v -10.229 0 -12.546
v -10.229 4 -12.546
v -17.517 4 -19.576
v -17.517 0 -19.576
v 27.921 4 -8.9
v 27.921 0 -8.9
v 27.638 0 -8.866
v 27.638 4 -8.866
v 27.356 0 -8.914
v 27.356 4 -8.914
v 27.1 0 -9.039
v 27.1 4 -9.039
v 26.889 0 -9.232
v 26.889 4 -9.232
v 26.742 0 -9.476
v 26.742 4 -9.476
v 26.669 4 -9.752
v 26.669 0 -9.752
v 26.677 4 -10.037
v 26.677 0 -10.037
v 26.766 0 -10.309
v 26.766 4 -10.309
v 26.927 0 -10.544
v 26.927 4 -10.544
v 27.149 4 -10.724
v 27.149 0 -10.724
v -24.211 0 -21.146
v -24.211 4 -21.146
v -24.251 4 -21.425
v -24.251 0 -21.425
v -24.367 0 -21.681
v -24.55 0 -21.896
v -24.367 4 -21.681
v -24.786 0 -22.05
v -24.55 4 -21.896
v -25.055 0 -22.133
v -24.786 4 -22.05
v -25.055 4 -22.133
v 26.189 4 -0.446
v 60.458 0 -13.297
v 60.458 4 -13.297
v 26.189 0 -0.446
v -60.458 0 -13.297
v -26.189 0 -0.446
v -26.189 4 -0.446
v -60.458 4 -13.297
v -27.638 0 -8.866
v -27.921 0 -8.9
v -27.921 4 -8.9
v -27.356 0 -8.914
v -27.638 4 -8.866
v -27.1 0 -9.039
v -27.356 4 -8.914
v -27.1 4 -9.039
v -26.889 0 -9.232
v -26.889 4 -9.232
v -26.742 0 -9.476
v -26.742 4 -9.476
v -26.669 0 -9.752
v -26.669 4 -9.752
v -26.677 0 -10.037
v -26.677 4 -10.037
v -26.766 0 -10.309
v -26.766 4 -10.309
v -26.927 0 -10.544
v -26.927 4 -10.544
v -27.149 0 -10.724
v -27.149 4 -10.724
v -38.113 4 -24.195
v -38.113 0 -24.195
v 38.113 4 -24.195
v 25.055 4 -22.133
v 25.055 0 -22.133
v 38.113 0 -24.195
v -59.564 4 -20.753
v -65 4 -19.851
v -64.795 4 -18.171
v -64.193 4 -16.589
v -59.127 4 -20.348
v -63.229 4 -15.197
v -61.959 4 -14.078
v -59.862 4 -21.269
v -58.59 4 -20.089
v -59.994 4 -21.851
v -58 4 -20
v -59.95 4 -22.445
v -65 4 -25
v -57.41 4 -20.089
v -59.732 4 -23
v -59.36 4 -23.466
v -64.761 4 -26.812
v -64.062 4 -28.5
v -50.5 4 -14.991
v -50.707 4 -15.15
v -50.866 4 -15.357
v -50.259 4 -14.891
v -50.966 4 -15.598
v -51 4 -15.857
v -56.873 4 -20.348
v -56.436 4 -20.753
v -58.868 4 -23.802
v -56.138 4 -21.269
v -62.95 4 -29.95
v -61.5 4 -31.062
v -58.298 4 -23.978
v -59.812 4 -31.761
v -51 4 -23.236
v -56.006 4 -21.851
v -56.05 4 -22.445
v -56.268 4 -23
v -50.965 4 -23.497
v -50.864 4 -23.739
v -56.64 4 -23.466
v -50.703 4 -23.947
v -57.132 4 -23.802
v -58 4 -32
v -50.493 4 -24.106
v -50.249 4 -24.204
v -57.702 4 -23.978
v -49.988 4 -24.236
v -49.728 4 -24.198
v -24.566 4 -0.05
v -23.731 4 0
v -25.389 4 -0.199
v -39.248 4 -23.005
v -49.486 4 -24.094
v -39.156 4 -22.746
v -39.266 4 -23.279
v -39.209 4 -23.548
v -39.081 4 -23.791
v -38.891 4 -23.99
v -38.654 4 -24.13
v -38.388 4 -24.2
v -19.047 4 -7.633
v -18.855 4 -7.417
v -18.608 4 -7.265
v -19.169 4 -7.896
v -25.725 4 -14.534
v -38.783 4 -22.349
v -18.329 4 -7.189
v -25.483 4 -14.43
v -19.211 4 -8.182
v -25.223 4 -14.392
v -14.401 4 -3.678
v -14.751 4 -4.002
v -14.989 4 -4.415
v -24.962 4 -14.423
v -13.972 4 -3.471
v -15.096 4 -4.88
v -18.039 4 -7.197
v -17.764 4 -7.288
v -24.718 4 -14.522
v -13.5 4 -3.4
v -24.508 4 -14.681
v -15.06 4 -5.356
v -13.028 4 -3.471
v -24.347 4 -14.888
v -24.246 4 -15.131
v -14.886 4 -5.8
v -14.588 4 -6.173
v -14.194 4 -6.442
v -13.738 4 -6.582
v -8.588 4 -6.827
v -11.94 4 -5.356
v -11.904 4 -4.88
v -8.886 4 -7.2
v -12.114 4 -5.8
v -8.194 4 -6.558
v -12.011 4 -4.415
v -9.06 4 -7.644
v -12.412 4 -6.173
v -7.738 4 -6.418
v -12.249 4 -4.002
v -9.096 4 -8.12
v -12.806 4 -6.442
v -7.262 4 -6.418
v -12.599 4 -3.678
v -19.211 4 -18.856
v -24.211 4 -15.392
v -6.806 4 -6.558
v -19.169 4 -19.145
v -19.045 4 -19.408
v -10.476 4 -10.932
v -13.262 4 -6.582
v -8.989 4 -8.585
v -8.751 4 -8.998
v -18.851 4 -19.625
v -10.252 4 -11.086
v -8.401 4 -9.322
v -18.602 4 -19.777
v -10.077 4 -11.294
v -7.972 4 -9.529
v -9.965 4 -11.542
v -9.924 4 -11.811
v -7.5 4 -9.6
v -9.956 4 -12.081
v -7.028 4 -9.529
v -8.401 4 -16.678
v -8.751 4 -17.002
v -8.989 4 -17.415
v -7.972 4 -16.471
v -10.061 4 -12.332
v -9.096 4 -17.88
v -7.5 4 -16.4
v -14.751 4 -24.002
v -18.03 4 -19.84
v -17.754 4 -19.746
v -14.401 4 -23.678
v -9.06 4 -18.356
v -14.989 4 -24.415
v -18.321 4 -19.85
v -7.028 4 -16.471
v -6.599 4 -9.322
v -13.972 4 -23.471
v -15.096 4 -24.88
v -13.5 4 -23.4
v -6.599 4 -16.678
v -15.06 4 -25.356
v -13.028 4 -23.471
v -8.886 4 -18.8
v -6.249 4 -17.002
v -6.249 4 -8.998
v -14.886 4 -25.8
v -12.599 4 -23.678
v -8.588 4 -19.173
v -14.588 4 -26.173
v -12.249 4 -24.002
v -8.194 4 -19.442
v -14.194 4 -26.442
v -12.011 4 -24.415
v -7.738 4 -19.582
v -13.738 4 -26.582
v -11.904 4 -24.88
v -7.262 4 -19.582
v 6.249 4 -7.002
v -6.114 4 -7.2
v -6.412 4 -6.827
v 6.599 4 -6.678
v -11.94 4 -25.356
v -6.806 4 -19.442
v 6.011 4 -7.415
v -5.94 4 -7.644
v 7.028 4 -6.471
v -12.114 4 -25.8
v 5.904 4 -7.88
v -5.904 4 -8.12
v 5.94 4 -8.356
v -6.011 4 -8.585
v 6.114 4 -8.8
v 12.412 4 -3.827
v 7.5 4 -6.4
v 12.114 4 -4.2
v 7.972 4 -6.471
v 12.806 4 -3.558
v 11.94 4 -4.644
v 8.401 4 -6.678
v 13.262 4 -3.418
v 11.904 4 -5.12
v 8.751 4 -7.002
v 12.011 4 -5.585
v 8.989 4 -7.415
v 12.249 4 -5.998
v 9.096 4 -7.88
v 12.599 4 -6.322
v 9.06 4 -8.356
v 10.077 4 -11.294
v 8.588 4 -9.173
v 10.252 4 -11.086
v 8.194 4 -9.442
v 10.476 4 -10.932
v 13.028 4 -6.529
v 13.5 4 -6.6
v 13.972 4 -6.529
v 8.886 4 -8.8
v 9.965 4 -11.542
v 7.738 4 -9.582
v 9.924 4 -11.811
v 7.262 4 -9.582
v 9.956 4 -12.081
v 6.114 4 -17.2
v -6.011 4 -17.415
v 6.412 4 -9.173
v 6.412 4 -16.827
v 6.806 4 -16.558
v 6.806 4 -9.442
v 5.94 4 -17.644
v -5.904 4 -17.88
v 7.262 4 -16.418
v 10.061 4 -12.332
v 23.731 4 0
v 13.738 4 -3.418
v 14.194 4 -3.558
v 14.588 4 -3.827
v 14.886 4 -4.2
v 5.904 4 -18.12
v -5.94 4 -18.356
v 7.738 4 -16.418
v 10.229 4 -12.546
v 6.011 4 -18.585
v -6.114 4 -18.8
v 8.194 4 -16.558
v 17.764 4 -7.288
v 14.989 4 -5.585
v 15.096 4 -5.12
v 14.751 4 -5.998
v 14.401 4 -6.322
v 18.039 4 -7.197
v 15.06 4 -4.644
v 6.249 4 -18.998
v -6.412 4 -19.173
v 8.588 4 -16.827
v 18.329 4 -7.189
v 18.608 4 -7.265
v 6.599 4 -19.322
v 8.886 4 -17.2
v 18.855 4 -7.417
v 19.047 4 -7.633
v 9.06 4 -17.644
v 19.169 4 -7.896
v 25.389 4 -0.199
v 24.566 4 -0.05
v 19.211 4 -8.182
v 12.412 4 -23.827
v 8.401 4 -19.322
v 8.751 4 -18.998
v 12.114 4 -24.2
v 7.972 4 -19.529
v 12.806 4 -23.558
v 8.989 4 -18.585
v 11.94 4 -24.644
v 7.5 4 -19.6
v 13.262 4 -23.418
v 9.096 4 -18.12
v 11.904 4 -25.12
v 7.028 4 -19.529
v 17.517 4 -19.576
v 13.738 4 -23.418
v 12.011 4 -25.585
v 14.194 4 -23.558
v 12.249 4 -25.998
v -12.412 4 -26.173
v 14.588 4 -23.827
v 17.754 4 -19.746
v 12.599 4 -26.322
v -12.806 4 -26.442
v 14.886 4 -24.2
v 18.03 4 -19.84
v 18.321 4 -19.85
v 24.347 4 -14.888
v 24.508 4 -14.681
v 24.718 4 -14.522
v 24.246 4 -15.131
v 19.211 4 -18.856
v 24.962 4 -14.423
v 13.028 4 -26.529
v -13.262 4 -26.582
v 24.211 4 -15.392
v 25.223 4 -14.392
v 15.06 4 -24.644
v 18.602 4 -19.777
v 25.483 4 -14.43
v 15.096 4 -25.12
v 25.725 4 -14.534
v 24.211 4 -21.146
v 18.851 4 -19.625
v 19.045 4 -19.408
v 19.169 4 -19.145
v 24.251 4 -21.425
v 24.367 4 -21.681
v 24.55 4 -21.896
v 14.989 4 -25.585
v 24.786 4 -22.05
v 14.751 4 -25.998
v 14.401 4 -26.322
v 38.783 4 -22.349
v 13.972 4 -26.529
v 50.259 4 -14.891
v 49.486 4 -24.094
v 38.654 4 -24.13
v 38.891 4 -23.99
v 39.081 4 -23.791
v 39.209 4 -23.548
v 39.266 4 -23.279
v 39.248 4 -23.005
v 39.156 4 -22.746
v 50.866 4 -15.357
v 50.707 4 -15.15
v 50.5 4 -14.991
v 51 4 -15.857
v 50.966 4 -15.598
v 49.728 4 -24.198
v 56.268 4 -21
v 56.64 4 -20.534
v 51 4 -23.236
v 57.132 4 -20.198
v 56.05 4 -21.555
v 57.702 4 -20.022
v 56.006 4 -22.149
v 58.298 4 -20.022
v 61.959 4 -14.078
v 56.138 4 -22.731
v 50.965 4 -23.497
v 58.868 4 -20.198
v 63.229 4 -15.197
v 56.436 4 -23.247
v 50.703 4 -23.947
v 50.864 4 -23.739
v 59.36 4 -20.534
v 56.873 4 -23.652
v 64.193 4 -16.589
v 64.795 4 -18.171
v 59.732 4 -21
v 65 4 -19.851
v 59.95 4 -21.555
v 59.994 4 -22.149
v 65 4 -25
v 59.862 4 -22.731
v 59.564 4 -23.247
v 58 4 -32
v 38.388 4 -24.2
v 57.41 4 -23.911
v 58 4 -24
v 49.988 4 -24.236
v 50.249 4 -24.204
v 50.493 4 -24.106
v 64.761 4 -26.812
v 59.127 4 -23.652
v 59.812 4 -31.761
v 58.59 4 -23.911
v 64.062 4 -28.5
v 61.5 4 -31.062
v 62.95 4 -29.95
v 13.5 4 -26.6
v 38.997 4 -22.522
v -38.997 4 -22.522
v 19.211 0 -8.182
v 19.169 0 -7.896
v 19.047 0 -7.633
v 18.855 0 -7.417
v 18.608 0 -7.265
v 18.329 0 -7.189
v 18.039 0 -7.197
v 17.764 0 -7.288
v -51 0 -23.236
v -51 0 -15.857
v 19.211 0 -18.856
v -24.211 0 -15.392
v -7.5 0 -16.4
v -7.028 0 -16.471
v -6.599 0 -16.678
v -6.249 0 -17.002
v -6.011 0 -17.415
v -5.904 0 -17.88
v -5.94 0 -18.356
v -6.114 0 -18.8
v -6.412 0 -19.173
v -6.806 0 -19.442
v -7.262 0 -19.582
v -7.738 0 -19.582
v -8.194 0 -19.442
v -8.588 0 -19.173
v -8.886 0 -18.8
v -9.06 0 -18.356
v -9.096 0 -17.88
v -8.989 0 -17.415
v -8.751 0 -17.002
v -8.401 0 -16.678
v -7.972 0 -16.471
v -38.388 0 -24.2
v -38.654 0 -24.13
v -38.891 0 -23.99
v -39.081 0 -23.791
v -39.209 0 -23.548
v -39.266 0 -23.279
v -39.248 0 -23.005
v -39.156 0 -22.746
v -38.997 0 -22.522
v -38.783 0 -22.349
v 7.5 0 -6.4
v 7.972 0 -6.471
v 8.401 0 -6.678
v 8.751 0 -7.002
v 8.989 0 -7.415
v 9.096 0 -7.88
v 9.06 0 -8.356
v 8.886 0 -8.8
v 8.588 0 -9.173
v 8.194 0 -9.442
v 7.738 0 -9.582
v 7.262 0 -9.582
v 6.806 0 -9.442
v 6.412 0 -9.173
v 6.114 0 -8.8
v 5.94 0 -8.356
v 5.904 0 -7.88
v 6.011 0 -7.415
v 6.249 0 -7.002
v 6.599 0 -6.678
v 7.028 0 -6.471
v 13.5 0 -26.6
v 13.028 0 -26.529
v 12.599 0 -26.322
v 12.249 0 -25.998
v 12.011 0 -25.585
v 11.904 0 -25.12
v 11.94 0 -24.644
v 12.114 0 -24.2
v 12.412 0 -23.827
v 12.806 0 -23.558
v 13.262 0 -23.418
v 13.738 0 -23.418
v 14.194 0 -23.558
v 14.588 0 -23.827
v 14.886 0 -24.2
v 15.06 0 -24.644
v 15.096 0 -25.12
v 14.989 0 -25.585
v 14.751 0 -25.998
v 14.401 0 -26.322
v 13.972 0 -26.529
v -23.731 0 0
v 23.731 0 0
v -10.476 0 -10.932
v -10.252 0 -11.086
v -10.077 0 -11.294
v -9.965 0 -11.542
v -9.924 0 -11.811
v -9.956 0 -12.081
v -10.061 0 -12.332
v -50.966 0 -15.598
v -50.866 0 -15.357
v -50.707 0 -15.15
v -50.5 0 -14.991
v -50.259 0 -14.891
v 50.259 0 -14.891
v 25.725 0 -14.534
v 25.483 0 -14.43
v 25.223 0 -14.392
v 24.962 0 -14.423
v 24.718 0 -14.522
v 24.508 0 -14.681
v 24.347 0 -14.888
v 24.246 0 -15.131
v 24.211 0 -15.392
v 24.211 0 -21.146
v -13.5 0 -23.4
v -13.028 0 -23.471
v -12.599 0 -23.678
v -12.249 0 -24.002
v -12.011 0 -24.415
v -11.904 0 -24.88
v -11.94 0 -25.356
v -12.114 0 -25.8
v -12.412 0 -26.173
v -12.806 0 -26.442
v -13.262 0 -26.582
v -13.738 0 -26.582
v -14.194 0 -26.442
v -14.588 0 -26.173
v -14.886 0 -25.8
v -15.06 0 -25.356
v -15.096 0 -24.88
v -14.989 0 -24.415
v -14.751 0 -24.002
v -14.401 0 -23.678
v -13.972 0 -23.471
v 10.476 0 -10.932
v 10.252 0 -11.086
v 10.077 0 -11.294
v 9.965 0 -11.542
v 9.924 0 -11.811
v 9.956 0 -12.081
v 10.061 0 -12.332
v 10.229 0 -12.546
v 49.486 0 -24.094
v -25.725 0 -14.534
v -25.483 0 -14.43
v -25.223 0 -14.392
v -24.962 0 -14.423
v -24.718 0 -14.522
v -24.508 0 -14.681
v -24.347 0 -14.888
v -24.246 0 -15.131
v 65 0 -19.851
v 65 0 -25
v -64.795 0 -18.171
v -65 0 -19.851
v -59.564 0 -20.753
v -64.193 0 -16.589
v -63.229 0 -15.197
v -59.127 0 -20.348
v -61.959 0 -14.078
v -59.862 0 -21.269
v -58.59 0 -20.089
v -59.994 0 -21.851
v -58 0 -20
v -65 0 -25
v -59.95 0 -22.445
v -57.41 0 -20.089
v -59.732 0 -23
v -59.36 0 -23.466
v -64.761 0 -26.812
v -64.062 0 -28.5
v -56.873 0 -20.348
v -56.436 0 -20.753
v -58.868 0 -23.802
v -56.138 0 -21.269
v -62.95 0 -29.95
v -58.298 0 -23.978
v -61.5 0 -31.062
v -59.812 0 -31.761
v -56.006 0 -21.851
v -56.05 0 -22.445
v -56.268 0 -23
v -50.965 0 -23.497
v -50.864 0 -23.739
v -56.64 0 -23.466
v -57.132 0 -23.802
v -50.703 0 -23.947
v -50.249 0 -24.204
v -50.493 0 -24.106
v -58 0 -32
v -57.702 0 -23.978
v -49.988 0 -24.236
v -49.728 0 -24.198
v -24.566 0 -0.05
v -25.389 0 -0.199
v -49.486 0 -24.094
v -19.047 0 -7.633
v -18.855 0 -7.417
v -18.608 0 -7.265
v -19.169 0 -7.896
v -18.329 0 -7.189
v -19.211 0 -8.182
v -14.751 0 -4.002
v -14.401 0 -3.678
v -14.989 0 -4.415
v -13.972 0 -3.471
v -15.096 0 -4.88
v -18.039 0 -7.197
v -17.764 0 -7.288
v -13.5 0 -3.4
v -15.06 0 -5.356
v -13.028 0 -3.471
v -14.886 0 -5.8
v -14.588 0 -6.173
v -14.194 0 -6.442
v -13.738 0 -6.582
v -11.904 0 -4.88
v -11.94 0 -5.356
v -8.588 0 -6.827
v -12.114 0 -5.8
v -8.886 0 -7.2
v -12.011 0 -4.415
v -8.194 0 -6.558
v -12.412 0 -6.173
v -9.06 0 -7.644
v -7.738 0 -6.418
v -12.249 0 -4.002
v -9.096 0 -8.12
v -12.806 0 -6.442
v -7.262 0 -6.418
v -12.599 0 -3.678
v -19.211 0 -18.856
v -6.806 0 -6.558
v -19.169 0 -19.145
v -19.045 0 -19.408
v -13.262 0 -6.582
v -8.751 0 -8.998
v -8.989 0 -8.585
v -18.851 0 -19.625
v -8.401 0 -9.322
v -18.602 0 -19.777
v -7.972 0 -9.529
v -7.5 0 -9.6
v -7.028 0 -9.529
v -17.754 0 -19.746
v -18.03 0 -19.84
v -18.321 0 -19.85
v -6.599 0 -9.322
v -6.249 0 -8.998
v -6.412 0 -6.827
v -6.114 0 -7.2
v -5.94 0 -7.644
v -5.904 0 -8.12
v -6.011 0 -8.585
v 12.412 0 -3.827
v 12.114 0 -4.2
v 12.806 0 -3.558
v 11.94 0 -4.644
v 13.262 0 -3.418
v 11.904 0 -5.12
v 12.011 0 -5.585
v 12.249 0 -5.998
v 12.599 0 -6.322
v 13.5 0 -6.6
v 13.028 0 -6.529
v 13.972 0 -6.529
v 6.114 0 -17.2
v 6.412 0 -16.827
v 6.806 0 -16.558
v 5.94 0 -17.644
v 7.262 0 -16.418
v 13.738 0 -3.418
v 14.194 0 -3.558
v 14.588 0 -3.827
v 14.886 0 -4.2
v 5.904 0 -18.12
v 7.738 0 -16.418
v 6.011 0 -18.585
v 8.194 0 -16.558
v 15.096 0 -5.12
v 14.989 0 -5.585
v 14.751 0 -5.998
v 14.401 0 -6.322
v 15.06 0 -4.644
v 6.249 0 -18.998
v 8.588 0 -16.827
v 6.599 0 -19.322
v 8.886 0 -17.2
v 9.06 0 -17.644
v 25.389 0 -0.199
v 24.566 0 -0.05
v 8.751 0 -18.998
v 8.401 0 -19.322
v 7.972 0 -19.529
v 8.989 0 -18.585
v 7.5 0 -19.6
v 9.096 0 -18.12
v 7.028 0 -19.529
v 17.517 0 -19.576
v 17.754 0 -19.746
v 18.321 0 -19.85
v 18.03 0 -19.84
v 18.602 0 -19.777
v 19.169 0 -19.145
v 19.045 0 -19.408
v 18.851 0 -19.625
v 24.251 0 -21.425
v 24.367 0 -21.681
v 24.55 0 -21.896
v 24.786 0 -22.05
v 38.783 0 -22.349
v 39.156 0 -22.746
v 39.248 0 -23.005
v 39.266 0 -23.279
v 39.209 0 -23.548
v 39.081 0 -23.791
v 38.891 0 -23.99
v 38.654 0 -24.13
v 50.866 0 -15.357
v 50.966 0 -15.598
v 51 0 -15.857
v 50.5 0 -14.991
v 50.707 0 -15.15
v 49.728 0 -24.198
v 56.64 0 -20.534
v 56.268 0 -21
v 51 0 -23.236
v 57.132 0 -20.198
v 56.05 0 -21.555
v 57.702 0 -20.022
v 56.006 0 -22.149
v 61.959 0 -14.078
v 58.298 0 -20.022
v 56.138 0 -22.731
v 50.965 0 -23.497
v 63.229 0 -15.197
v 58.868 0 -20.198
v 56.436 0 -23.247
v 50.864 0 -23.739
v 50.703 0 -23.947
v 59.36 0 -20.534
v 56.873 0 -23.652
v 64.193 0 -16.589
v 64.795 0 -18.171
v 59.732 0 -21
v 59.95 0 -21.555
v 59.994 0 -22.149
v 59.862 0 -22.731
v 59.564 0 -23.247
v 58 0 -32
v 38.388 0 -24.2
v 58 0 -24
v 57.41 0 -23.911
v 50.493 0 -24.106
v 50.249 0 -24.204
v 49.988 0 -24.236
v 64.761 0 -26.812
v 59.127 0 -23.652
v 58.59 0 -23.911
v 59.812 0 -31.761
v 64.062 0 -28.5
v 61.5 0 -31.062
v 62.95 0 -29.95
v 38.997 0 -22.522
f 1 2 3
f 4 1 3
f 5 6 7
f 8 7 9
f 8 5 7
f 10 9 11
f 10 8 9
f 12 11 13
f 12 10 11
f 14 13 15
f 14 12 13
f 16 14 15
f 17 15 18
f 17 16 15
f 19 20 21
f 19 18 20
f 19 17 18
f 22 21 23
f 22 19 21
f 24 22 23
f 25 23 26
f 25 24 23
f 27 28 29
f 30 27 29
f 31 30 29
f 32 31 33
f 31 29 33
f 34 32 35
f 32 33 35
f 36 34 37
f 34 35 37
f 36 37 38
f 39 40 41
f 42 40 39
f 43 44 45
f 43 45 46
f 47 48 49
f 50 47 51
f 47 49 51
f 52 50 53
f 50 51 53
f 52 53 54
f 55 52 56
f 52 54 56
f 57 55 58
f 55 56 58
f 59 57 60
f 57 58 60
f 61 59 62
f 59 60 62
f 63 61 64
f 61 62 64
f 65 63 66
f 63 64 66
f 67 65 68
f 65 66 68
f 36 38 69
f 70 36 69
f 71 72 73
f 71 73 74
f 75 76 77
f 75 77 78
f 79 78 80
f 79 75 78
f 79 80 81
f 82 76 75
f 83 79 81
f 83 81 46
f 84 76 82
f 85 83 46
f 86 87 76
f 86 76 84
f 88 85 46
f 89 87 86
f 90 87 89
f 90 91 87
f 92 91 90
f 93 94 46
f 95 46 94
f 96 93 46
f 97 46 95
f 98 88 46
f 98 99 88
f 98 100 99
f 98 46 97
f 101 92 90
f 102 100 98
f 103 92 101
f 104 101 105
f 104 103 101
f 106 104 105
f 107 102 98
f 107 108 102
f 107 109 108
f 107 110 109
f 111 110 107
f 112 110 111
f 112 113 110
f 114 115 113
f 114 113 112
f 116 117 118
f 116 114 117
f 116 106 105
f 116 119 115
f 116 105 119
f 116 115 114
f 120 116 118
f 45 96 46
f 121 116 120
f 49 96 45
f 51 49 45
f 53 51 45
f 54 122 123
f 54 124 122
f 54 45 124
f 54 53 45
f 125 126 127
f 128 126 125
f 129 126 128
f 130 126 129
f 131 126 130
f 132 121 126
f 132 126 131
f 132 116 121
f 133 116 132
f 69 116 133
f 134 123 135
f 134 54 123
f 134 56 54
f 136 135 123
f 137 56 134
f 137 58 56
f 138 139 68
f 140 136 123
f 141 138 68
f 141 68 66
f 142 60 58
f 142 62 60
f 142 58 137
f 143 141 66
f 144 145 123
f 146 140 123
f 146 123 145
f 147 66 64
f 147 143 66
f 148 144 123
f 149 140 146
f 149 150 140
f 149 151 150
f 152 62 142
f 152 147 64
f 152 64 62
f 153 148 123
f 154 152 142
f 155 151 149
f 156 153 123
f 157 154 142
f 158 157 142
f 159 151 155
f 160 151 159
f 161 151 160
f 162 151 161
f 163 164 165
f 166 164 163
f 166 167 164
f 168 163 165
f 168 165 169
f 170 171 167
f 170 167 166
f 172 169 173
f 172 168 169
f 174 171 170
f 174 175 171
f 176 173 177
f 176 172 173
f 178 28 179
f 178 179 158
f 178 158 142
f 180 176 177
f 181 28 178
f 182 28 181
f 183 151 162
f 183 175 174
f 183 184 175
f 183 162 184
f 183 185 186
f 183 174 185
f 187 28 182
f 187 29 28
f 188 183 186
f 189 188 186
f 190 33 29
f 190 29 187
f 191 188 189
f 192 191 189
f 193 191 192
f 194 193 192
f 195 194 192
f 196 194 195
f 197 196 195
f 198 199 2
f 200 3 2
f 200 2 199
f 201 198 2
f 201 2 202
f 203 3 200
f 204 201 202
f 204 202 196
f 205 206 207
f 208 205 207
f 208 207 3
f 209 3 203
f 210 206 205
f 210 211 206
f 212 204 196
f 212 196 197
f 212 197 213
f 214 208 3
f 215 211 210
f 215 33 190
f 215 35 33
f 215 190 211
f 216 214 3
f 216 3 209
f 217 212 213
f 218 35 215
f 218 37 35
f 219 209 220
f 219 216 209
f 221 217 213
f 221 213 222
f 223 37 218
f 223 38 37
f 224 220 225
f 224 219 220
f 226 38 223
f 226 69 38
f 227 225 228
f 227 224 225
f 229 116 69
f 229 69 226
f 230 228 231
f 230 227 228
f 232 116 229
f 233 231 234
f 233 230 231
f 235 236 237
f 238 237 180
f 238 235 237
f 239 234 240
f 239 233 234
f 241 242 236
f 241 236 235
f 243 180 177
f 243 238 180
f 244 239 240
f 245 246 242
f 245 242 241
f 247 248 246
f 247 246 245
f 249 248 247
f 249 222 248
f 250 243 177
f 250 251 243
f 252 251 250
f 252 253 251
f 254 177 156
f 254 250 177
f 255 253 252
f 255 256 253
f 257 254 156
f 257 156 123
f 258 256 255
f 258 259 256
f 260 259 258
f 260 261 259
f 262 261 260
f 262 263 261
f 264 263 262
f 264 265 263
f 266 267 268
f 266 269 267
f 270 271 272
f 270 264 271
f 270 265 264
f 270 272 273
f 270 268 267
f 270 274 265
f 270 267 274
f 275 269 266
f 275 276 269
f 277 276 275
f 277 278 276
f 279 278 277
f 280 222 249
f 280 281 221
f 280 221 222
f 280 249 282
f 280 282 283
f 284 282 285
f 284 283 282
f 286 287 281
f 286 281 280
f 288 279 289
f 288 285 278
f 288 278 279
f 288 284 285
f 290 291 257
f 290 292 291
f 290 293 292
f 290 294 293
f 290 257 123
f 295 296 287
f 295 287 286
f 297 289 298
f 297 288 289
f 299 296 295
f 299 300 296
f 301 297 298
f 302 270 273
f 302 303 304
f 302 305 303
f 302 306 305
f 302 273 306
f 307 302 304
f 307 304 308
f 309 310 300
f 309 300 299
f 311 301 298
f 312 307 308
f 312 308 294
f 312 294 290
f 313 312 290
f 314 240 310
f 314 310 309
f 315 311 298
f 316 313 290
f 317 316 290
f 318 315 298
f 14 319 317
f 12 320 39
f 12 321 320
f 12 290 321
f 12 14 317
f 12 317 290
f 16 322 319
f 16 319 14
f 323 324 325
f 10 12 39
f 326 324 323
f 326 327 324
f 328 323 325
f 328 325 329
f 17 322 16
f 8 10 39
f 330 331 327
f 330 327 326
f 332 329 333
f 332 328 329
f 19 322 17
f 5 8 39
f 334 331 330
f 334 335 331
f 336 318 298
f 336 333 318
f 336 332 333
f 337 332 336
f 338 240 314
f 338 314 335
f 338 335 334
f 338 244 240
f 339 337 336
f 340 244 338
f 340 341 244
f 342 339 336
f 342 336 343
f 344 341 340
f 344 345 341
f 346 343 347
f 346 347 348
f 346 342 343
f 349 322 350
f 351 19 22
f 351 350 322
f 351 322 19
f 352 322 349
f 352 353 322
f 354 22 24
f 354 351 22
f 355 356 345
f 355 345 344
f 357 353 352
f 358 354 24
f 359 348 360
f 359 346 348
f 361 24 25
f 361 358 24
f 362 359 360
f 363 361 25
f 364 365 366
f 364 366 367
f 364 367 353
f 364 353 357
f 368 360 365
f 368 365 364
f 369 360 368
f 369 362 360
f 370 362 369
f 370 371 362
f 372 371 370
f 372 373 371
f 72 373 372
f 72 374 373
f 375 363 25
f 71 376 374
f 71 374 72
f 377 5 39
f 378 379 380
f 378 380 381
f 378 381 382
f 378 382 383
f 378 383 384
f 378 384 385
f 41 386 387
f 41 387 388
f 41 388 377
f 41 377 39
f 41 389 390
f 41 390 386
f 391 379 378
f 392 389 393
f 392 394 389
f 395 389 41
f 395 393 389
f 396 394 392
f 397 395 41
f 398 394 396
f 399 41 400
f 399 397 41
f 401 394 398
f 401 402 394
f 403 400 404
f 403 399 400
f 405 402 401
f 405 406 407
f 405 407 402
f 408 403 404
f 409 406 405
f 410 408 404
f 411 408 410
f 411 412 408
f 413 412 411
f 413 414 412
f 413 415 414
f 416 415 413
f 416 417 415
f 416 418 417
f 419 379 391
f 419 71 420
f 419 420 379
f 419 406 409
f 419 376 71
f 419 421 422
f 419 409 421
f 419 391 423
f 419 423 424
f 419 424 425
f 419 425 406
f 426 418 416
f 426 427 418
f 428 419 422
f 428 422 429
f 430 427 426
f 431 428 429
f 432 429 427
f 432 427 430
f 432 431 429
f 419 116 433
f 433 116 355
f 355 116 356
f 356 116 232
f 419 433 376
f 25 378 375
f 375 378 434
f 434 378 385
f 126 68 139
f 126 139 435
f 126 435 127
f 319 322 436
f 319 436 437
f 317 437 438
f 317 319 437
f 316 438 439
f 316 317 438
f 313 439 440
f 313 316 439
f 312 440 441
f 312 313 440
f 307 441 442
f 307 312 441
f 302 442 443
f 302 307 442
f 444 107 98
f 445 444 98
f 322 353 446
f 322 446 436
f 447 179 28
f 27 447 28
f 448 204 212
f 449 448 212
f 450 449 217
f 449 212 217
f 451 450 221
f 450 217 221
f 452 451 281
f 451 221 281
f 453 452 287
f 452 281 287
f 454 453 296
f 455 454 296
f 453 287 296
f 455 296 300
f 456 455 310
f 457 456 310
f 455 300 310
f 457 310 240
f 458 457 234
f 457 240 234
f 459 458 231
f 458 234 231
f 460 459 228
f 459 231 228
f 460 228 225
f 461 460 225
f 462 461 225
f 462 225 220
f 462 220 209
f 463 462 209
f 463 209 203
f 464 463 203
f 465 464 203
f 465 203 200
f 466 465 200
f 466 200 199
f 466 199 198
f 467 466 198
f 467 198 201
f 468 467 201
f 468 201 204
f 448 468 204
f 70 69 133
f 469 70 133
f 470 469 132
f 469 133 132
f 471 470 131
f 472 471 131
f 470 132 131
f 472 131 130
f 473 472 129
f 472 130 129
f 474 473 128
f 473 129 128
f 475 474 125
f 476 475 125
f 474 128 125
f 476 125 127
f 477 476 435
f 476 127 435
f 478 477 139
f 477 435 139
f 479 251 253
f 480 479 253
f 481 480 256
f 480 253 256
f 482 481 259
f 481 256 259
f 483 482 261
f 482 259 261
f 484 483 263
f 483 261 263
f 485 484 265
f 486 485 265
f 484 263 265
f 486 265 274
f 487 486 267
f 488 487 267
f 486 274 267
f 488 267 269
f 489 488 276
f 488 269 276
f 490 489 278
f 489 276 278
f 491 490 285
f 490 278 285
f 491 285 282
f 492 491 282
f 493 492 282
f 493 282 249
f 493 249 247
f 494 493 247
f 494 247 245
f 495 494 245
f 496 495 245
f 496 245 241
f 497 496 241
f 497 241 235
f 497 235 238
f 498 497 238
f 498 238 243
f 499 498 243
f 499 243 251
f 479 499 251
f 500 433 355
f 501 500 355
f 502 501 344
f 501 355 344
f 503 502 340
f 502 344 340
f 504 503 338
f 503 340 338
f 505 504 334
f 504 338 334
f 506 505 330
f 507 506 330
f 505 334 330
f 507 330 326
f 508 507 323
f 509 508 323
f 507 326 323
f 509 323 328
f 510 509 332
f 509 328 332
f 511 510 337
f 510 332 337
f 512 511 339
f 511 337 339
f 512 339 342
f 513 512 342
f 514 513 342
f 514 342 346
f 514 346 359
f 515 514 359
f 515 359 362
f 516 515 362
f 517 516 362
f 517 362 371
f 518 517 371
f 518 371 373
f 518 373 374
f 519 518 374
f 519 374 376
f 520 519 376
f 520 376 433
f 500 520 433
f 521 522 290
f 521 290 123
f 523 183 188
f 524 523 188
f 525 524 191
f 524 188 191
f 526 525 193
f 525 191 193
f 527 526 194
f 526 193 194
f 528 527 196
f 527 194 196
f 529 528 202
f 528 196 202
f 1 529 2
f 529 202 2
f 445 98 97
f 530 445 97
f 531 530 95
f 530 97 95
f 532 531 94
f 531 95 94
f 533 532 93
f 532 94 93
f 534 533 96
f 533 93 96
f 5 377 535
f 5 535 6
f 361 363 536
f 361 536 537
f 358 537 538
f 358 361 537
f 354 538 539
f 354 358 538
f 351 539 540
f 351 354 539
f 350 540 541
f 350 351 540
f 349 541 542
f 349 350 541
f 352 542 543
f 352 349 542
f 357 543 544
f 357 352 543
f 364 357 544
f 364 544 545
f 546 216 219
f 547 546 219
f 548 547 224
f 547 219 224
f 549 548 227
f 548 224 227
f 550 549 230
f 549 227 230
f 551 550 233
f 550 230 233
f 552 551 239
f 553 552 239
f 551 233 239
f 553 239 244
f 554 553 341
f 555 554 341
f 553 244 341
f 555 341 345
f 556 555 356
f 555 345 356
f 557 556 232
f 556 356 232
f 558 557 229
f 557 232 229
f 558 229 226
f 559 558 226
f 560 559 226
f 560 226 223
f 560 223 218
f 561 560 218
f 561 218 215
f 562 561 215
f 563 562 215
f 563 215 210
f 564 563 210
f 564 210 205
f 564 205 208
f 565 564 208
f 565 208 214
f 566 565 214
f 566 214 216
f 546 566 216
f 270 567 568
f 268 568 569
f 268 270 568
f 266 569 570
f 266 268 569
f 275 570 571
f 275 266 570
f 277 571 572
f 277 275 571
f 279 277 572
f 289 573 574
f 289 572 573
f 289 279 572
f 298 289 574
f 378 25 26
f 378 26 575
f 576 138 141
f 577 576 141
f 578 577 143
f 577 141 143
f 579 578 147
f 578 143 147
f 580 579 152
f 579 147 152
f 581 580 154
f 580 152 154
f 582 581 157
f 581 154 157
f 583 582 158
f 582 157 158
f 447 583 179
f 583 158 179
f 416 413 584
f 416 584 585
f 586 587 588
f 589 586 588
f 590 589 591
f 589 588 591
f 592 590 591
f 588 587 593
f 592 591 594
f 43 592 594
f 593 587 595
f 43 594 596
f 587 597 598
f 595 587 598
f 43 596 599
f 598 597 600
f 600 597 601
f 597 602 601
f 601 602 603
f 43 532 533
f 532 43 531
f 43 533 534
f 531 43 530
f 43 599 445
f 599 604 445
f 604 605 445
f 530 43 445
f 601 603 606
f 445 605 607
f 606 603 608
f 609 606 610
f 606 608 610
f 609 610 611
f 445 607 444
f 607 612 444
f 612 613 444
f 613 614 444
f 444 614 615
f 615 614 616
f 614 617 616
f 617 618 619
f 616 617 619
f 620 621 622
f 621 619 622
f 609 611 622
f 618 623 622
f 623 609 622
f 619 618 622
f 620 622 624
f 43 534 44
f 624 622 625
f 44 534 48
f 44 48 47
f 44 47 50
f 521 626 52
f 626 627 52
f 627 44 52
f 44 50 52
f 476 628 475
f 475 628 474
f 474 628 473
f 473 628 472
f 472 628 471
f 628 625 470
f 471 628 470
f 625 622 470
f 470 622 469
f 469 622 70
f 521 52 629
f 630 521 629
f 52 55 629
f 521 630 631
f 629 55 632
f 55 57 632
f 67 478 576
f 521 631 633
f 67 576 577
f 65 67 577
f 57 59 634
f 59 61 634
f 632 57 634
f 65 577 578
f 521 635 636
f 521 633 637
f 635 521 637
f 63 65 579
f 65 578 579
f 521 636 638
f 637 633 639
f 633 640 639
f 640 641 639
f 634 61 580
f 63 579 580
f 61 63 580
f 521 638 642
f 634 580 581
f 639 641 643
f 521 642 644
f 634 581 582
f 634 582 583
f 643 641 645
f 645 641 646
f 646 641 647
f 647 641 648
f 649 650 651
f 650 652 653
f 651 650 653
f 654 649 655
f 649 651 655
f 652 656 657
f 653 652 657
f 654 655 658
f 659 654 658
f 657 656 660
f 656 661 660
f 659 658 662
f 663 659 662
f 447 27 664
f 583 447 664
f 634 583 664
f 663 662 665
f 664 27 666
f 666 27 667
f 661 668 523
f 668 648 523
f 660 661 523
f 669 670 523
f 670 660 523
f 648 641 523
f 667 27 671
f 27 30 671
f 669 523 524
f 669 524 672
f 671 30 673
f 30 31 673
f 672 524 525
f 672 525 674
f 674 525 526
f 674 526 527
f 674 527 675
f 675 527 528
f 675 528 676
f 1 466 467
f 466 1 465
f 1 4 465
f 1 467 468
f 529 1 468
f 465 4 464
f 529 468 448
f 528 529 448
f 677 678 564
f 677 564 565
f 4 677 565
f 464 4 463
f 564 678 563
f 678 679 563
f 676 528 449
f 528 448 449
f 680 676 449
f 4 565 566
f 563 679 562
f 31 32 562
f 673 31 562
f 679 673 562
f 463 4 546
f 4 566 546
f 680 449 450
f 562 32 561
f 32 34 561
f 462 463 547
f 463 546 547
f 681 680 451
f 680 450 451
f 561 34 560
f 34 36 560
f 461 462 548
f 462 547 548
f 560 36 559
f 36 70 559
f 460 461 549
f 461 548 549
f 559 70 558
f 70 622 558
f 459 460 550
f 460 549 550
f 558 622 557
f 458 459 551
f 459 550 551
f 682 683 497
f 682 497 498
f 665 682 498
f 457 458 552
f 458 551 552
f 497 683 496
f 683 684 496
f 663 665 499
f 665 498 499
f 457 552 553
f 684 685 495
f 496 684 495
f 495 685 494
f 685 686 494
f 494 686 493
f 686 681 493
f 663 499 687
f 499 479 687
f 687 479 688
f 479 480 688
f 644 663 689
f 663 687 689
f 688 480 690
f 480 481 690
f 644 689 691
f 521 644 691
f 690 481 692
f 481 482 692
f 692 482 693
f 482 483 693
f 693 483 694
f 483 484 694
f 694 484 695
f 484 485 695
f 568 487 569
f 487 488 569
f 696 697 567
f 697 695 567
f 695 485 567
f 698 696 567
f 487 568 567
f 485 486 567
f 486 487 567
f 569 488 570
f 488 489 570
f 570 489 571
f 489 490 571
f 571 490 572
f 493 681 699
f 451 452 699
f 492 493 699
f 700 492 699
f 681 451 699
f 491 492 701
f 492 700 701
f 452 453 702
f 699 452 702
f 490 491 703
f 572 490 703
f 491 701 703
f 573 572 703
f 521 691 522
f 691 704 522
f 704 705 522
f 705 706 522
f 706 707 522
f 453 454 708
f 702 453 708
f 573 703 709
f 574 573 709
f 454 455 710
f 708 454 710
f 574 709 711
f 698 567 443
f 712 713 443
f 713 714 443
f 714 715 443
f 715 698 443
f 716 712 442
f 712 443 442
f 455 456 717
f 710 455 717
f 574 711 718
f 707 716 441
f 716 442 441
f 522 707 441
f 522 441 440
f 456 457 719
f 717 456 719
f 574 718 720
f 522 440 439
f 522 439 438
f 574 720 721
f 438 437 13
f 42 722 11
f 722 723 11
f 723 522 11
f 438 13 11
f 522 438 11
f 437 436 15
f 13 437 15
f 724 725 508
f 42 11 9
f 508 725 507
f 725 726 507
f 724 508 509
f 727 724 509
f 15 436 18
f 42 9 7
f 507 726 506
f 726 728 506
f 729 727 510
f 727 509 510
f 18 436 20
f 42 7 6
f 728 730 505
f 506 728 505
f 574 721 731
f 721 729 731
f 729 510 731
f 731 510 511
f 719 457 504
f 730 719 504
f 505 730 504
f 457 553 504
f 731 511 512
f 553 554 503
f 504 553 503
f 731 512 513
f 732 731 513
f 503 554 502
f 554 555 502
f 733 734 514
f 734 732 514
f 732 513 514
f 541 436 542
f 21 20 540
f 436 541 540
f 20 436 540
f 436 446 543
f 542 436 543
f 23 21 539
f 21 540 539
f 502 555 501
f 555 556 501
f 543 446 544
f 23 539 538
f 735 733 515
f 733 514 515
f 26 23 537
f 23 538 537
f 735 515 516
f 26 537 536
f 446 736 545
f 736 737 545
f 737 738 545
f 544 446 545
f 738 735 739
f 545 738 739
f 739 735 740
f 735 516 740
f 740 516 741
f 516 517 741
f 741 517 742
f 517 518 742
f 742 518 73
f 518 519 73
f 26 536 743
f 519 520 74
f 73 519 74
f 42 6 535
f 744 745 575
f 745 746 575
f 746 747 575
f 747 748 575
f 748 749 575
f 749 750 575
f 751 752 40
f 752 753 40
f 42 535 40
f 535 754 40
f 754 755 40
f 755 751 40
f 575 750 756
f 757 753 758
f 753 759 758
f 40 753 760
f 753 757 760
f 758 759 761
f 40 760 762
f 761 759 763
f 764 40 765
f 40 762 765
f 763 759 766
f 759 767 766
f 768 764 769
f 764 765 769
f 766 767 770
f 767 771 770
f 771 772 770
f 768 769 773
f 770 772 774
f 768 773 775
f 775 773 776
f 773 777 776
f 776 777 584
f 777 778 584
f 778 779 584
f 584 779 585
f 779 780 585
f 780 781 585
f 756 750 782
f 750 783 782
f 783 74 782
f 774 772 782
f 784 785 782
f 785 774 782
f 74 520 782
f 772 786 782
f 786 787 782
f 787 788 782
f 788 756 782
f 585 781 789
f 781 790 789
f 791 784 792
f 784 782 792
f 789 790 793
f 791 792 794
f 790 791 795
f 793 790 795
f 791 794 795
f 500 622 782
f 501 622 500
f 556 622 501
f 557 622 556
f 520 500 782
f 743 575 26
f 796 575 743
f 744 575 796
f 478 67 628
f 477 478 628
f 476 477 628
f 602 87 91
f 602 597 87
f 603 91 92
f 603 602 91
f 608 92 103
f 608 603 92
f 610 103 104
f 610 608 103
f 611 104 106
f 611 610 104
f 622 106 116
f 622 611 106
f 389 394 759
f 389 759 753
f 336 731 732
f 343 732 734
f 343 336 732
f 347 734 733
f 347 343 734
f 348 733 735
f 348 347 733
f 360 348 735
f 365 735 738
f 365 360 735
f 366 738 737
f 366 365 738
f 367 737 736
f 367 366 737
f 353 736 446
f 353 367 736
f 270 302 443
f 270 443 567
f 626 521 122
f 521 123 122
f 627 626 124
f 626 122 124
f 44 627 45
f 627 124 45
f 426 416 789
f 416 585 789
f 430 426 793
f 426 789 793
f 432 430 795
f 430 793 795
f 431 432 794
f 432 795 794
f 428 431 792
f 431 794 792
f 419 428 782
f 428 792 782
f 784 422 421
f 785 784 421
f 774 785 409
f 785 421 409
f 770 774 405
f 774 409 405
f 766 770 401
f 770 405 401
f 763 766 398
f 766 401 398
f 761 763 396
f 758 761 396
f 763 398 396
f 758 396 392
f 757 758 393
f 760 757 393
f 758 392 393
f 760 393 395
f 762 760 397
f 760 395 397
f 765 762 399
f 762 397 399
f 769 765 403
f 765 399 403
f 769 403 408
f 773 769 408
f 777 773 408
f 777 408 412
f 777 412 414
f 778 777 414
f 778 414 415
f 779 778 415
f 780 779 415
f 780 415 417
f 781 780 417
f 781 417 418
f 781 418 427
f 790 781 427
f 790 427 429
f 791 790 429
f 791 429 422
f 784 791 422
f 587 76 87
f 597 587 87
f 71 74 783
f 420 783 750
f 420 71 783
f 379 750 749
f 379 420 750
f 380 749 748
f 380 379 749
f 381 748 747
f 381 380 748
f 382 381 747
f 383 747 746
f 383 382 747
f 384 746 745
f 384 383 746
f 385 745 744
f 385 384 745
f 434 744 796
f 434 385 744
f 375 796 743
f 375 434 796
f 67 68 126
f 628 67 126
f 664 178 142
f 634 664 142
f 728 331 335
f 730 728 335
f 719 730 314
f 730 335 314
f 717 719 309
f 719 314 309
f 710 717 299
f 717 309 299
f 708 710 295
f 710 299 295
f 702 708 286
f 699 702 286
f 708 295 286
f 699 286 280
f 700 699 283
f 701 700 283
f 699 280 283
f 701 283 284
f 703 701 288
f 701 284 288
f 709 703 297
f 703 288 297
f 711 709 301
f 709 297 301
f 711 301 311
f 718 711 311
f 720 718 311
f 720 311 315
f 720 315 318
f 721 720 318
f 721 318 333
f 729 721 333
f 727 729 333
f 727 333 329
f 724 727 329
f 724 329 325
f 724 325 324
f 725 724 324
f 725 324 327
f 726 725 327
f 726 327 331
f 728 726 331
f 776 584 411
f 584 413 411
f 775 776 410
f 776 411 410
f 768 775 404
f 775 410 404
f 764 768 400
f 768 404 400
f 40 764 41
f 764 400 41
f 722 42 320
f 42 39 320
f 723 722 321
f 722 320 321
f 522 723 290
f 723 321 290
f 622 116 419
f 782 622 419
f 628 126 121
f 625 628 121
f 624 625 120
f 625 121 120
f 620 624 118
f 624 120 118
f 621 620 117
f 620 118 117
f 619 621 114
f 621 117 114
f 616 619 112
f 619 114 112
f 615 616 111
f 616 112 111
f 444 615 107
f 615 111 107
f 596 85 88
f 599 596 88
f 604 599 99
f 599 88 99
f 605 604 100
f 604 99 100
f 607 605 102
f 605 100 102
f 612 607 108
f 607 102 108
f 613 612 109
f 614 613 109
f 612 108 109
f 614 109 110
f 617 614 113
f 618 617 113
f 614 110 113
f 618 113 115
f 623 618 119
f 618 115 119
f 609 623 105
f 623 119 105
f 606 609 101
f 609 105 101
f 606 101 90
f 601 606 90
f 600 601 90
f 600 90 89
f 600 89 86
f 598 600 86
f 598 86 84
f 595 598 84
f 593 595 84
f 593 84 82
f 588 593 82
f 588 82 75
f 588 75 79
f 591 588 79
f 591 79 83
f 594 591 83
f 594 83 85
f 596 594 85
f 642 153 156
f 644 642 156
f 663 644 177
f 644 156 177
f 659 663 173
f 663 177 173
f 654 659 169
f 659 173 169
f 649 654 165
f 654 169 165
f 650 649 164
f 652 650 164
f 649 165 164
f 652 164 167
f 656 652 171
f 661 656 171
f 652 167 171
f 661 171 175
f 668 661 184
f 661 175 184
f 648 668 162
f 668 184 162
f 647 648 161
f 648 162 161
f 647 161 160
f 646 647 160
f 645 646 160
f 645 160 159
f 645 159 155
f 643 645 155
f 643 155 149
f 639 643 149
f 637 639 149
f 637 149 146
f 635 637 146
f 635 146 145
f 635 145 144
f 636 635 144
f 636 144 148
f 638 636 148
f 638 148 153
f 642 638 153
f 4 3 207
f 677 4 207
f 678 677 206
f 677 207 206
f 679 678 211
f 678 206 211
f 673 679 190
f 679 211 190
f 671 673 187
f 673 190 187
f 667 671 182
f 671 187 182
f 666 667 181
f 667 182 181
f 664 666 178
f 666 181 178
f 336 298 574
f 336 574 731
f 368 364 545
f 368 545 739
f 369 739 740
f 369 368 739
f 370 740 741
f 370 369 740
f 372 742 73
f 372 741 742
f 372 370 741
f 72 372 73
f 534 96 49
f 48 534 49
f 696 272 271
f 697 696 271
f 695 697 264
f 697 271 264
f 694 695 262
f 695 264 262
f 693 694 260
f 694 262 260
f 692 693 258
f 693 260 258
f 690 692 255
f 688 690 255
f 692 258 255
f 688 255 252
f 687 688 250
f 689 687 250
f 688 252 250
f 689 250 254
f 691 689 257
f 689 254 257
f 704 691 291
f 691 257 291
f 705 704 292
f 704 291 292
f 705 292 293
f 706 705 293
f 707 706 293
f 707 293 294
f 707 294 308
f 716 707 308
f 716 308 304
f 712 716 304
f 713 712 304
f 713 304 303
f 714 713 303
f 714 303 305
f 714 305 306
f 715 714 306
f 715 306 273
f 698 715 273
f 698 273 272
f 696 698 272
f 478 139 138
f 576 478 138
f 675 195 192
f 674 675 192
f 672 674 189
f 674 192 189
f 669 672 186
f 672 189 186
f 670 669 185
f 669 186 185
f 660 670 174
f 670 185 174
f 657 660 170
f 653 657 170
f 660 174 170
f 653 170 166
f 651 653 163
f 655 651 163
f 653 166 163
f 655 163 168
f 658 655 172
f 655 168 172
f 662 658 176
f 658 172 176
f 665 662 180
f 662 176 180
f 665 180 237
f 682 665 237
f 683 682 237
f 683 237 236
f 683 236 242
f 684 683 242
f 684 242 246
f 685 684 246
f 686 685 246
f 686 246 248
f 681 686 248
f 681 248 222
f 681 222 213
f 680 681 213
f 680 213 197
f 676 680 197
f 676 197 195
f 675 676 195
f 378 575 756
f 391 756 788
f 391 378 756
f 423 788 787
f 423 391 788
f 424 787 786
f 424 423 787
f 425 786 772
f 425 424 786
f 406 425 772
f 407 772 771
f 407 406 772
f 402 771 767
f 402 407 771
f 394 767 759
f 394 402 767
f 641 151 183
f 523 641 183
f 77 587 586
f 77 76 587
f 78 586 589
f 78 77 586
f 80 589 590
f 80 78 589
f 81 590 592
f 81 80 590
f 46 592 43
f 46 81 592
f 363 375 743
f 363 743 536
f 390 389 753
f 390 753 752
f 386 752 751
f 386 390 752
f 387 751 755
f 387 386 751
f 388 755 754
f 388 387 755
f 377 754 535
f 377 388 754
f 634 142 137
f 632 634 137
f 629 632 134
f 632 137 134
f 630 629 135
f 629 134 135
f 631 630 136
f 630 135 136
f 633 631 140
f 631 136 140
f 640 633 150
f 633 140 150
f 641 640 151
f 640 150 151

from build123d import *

# Parameters (mm, degrees)
EXTRUDE_1_DEPTH     = 4
SKETCH_2_R          = 1.6
CUT_EXTRUDE_1_DEPTH = 72.700767081
SKETCH_3_R          = 2
SKETCH_3_R_2        = 1.6
CUT_EXTRUDE_2_DEPTH = 72.700767081
SKETCH_4_W          = 130
SKETCH_4_H          = 2
EXTRUDE_2_DEPTH     = 4
FILLET_1_R          = 7


with BuildPart() as part:
    # 草图1 → 凸台-拉伸1 (new body)
    with BuildSketch(Plane(origin=(0, 0, 0), x_dir=(1, 0, 0), z_dir=(0, 1, 0))):
        Polygon((25, 0), (-25, 0), (-65, 15), (-65, 30), (65, 30), (65, 15), align=None)
    extrude(amount=EXTRUDE_1_DEPTH)

    # 草图2 → 切除-拉伸1 (cut, through all)
    with BuildSketch(Plane(origin=(0, 4, 0), x_dir=(1, 0, 0), z_dir=(0, 1, 0))):
        with Locations(Location((-7.5, 18, 0), (0, 0, 270))):
            Circle(SKETCH_2_R)
        with Locations(Location((7.5, 18, 0), (0, 0, 90))):
            Circle(SKETCH_2_R)
        with Locations(Location((-7.5, 8, 0), (0, 0, 90))):
            Circle(SKETCH_2_R)
        with Locations(Location((7.5, 8, 0), (0, 0, 270))):
            Circle(SKETCH_2_R)
    extrude(amount=-CUT_EXTRUDE_1_DEPTH, mode=Mode.SUBTRACT)

    # 草图3 → 切除-拉伸2 (cut, through all)
    with BuildSketch(Plane(origin=(0, 4, 0), x_dir=(1, 0, 0), z_dir=(0, 1, 0))):
        with Locations(Location((-58, 22, 0), (0, 0, 270))):
            Circle(SKETCH_3_R)
        with Locations(Location((58, 22, 0), (0, 0, 90))):
            Circle(SKETCH_3_R)
        with Locations(Location((-13.5, 5, 0), (0, 0, 270))):
            Circle(SKETCH_3_R_2)
        with Locations(Location((-13.5, 25, 0), (0, 0, 270))):
            Circle(SKETCH_3_R_2)
        with Locations(Location((13.5, 5, 0), (0, 0, 90))):
            Circle(SKETCH_3_R_2)
        with Locations(Location((13.5, 25, 0), (0, 0, 90))):
            Circle(SKETCH_3_R_2)
        with BuildLine():
            Line((-51, 23.236030392), (-51, 15.857143498))
            ThreePointArc((-51, 15.857143498), (-50.793424544, 15.248474875), (-50.259045015, 14.891278248))
            Line((-50.259045015, 14.891278248), (-27.921339757, 8.900306744))
            ThreePointArc((-27.921339757, 8.900306744), (-26.741501421, 9.476121152), (-27.148724711, 10.724219675))
            Line((-27.148724711, 10.724219675), (-49.486429968, 24.094078073))
            ThreePointArc((-49.486429968, 24.094078073), (-50.493168312, 24.105964306), (-51, 23.236030392))
        make_face()
        with BuildLine():
            Line((-38.782523044, 22.349179917), (-25.724953573, 14.533790966))
            ThreePointArc((-25.724953573, 14.533790966), (-24.718215229, 14.521904732), (-24.211383541, 15.391838647))
            Line((-24.211383541, 15.391838647), (-24.211383541, 21.145506102))
            ThreePointArc((-24.211383541, 21.145506102), (-24.451132736, 21.795135776), (-25.055420968, 22.133269067))
            Line((-25.055420968, 22.133269067), (-38.112990439, 24.194990563))
            ThreePointArc((-38.112990439, 24.194990563), (-39.209019504, 23.548218787), (-38.782523044, 22.349179917))
        make_face()
        with BuildLine():
            Line((-10.229137867, 12.546046067), (-17.517122215, 19.57620297))
            ThreePointArc((-17.517122215, 19.57620297), (-18.602368626, 19.776876975), (-19.211383541, 18.856479961))
            Line((-19.211383541, 18.856479961), (-19.211383541, 8.182330884))
            ThreePointArc((-19.211383541, 8.182330884), (-18.737114654, 7.331680075), (-17.764169946, 7.287903693))
            Line((-17.764169946, 7.287903693), (-10.476185598, 10.931895866))
            ThreePointArc((-10.476185598, 10.931895866), (-9.934909706, 11.67503349), (-10.229137867, 12.546046067))
        make_face()
        with BuildLine():
            Line((17.764169946, 7.287903693), (10.476185598, 10.931895866))
            ThreePointArc((10.476185598, 10.931895866), (9.934909706, 11.67503349), (10.229137867, 12.546046067))
            Line((10.229137867, 12.546046067), (17.517122215, 19.57620297))
            ThreePointArc((17.517122215, 19.57620297), (18.602368626, 19.776876975), (19.211383541, 18.856479961))
            Line((19.211383541, 18.856479961), (19.211383541, 8.182330884))
            ThreePointArc((19.211383541, 8.182330884), (18.737114654, 7.331680075), (17.764169946, 7.287903693))
        make_face()
        with BuildLine():
            Line((25.055420968, 22.133269067), (38.112990439, 24.194990563))
            ThreePointArc((38.112990439, 24.194990563), (39.209019504, 23.548218787), (38.782523044, 22.349179917))
            Line((38.782523044, 22.349179917), (25.724953573, 14.533790966))
            ThreePointArc((25.724953573, 14.533790966), (24.718215229, 14.521904732), (24.211383541, 15.391838647))
            Line((24.211383541, 15.391838647), (24.211383541, 21.145506102))
            ThreePointArc((24.211383541, 21.145506102), (24.451132736, 21.795135776), (25.055420968, 22.133269067))
        make_face()
        with BuildLine():
            Line((27.148724711, 10.724219675), (49.486429968, 24.094078073))
            ThreePointArc((49.486429968, 24.094078073), (50.493168312, 24.105964306), (51, 23.236030392))
            Line((51, 23.236030392), (51, 15.857143498))
            ThreePointArc((51, 15.857143498), (50.793424544, 15.248474875), (50.259045015, 14.891278248))
            Line((50.259045015, 14.891278248), (27.921339757, 8.900306744))
            ThreePointArc((27.921339757, 8.900306744), (26.741501421, 9.476121152), (27.148724711, 10.724219675))
        make_face()
    extrude(amount=-CUT_EXTRUDE_2_DEPTH, mode=Mode.SUBTRACT)

    # 草图4 → 凸台-拉伸2 (add)
    with BuildSketch(Plane(origin=(0, 4, 0), x_dir=(1, 0, 0), z_dir=(0, 1, 0))):
        with Locations((0, 31)):
            Rectangle(SKETCH_4_W, SKETCH_4_H)
    extrude(amount=-EXTRUDE_2_DEPTH)

    # 圆角1
    fillet_1_edges = [part.edges().sort_by_distance(p)[0] for p in [
        (-65, 2, -15),
        (65, 2, -15),
        (25, 2, 0),
        (-25, 2, 0),
        (-65, 2, -32),
        (65, 2, -32),
    ]]
    fillet(fillet_1_edges, radius=FILLET_1_R)


solid = part.part
